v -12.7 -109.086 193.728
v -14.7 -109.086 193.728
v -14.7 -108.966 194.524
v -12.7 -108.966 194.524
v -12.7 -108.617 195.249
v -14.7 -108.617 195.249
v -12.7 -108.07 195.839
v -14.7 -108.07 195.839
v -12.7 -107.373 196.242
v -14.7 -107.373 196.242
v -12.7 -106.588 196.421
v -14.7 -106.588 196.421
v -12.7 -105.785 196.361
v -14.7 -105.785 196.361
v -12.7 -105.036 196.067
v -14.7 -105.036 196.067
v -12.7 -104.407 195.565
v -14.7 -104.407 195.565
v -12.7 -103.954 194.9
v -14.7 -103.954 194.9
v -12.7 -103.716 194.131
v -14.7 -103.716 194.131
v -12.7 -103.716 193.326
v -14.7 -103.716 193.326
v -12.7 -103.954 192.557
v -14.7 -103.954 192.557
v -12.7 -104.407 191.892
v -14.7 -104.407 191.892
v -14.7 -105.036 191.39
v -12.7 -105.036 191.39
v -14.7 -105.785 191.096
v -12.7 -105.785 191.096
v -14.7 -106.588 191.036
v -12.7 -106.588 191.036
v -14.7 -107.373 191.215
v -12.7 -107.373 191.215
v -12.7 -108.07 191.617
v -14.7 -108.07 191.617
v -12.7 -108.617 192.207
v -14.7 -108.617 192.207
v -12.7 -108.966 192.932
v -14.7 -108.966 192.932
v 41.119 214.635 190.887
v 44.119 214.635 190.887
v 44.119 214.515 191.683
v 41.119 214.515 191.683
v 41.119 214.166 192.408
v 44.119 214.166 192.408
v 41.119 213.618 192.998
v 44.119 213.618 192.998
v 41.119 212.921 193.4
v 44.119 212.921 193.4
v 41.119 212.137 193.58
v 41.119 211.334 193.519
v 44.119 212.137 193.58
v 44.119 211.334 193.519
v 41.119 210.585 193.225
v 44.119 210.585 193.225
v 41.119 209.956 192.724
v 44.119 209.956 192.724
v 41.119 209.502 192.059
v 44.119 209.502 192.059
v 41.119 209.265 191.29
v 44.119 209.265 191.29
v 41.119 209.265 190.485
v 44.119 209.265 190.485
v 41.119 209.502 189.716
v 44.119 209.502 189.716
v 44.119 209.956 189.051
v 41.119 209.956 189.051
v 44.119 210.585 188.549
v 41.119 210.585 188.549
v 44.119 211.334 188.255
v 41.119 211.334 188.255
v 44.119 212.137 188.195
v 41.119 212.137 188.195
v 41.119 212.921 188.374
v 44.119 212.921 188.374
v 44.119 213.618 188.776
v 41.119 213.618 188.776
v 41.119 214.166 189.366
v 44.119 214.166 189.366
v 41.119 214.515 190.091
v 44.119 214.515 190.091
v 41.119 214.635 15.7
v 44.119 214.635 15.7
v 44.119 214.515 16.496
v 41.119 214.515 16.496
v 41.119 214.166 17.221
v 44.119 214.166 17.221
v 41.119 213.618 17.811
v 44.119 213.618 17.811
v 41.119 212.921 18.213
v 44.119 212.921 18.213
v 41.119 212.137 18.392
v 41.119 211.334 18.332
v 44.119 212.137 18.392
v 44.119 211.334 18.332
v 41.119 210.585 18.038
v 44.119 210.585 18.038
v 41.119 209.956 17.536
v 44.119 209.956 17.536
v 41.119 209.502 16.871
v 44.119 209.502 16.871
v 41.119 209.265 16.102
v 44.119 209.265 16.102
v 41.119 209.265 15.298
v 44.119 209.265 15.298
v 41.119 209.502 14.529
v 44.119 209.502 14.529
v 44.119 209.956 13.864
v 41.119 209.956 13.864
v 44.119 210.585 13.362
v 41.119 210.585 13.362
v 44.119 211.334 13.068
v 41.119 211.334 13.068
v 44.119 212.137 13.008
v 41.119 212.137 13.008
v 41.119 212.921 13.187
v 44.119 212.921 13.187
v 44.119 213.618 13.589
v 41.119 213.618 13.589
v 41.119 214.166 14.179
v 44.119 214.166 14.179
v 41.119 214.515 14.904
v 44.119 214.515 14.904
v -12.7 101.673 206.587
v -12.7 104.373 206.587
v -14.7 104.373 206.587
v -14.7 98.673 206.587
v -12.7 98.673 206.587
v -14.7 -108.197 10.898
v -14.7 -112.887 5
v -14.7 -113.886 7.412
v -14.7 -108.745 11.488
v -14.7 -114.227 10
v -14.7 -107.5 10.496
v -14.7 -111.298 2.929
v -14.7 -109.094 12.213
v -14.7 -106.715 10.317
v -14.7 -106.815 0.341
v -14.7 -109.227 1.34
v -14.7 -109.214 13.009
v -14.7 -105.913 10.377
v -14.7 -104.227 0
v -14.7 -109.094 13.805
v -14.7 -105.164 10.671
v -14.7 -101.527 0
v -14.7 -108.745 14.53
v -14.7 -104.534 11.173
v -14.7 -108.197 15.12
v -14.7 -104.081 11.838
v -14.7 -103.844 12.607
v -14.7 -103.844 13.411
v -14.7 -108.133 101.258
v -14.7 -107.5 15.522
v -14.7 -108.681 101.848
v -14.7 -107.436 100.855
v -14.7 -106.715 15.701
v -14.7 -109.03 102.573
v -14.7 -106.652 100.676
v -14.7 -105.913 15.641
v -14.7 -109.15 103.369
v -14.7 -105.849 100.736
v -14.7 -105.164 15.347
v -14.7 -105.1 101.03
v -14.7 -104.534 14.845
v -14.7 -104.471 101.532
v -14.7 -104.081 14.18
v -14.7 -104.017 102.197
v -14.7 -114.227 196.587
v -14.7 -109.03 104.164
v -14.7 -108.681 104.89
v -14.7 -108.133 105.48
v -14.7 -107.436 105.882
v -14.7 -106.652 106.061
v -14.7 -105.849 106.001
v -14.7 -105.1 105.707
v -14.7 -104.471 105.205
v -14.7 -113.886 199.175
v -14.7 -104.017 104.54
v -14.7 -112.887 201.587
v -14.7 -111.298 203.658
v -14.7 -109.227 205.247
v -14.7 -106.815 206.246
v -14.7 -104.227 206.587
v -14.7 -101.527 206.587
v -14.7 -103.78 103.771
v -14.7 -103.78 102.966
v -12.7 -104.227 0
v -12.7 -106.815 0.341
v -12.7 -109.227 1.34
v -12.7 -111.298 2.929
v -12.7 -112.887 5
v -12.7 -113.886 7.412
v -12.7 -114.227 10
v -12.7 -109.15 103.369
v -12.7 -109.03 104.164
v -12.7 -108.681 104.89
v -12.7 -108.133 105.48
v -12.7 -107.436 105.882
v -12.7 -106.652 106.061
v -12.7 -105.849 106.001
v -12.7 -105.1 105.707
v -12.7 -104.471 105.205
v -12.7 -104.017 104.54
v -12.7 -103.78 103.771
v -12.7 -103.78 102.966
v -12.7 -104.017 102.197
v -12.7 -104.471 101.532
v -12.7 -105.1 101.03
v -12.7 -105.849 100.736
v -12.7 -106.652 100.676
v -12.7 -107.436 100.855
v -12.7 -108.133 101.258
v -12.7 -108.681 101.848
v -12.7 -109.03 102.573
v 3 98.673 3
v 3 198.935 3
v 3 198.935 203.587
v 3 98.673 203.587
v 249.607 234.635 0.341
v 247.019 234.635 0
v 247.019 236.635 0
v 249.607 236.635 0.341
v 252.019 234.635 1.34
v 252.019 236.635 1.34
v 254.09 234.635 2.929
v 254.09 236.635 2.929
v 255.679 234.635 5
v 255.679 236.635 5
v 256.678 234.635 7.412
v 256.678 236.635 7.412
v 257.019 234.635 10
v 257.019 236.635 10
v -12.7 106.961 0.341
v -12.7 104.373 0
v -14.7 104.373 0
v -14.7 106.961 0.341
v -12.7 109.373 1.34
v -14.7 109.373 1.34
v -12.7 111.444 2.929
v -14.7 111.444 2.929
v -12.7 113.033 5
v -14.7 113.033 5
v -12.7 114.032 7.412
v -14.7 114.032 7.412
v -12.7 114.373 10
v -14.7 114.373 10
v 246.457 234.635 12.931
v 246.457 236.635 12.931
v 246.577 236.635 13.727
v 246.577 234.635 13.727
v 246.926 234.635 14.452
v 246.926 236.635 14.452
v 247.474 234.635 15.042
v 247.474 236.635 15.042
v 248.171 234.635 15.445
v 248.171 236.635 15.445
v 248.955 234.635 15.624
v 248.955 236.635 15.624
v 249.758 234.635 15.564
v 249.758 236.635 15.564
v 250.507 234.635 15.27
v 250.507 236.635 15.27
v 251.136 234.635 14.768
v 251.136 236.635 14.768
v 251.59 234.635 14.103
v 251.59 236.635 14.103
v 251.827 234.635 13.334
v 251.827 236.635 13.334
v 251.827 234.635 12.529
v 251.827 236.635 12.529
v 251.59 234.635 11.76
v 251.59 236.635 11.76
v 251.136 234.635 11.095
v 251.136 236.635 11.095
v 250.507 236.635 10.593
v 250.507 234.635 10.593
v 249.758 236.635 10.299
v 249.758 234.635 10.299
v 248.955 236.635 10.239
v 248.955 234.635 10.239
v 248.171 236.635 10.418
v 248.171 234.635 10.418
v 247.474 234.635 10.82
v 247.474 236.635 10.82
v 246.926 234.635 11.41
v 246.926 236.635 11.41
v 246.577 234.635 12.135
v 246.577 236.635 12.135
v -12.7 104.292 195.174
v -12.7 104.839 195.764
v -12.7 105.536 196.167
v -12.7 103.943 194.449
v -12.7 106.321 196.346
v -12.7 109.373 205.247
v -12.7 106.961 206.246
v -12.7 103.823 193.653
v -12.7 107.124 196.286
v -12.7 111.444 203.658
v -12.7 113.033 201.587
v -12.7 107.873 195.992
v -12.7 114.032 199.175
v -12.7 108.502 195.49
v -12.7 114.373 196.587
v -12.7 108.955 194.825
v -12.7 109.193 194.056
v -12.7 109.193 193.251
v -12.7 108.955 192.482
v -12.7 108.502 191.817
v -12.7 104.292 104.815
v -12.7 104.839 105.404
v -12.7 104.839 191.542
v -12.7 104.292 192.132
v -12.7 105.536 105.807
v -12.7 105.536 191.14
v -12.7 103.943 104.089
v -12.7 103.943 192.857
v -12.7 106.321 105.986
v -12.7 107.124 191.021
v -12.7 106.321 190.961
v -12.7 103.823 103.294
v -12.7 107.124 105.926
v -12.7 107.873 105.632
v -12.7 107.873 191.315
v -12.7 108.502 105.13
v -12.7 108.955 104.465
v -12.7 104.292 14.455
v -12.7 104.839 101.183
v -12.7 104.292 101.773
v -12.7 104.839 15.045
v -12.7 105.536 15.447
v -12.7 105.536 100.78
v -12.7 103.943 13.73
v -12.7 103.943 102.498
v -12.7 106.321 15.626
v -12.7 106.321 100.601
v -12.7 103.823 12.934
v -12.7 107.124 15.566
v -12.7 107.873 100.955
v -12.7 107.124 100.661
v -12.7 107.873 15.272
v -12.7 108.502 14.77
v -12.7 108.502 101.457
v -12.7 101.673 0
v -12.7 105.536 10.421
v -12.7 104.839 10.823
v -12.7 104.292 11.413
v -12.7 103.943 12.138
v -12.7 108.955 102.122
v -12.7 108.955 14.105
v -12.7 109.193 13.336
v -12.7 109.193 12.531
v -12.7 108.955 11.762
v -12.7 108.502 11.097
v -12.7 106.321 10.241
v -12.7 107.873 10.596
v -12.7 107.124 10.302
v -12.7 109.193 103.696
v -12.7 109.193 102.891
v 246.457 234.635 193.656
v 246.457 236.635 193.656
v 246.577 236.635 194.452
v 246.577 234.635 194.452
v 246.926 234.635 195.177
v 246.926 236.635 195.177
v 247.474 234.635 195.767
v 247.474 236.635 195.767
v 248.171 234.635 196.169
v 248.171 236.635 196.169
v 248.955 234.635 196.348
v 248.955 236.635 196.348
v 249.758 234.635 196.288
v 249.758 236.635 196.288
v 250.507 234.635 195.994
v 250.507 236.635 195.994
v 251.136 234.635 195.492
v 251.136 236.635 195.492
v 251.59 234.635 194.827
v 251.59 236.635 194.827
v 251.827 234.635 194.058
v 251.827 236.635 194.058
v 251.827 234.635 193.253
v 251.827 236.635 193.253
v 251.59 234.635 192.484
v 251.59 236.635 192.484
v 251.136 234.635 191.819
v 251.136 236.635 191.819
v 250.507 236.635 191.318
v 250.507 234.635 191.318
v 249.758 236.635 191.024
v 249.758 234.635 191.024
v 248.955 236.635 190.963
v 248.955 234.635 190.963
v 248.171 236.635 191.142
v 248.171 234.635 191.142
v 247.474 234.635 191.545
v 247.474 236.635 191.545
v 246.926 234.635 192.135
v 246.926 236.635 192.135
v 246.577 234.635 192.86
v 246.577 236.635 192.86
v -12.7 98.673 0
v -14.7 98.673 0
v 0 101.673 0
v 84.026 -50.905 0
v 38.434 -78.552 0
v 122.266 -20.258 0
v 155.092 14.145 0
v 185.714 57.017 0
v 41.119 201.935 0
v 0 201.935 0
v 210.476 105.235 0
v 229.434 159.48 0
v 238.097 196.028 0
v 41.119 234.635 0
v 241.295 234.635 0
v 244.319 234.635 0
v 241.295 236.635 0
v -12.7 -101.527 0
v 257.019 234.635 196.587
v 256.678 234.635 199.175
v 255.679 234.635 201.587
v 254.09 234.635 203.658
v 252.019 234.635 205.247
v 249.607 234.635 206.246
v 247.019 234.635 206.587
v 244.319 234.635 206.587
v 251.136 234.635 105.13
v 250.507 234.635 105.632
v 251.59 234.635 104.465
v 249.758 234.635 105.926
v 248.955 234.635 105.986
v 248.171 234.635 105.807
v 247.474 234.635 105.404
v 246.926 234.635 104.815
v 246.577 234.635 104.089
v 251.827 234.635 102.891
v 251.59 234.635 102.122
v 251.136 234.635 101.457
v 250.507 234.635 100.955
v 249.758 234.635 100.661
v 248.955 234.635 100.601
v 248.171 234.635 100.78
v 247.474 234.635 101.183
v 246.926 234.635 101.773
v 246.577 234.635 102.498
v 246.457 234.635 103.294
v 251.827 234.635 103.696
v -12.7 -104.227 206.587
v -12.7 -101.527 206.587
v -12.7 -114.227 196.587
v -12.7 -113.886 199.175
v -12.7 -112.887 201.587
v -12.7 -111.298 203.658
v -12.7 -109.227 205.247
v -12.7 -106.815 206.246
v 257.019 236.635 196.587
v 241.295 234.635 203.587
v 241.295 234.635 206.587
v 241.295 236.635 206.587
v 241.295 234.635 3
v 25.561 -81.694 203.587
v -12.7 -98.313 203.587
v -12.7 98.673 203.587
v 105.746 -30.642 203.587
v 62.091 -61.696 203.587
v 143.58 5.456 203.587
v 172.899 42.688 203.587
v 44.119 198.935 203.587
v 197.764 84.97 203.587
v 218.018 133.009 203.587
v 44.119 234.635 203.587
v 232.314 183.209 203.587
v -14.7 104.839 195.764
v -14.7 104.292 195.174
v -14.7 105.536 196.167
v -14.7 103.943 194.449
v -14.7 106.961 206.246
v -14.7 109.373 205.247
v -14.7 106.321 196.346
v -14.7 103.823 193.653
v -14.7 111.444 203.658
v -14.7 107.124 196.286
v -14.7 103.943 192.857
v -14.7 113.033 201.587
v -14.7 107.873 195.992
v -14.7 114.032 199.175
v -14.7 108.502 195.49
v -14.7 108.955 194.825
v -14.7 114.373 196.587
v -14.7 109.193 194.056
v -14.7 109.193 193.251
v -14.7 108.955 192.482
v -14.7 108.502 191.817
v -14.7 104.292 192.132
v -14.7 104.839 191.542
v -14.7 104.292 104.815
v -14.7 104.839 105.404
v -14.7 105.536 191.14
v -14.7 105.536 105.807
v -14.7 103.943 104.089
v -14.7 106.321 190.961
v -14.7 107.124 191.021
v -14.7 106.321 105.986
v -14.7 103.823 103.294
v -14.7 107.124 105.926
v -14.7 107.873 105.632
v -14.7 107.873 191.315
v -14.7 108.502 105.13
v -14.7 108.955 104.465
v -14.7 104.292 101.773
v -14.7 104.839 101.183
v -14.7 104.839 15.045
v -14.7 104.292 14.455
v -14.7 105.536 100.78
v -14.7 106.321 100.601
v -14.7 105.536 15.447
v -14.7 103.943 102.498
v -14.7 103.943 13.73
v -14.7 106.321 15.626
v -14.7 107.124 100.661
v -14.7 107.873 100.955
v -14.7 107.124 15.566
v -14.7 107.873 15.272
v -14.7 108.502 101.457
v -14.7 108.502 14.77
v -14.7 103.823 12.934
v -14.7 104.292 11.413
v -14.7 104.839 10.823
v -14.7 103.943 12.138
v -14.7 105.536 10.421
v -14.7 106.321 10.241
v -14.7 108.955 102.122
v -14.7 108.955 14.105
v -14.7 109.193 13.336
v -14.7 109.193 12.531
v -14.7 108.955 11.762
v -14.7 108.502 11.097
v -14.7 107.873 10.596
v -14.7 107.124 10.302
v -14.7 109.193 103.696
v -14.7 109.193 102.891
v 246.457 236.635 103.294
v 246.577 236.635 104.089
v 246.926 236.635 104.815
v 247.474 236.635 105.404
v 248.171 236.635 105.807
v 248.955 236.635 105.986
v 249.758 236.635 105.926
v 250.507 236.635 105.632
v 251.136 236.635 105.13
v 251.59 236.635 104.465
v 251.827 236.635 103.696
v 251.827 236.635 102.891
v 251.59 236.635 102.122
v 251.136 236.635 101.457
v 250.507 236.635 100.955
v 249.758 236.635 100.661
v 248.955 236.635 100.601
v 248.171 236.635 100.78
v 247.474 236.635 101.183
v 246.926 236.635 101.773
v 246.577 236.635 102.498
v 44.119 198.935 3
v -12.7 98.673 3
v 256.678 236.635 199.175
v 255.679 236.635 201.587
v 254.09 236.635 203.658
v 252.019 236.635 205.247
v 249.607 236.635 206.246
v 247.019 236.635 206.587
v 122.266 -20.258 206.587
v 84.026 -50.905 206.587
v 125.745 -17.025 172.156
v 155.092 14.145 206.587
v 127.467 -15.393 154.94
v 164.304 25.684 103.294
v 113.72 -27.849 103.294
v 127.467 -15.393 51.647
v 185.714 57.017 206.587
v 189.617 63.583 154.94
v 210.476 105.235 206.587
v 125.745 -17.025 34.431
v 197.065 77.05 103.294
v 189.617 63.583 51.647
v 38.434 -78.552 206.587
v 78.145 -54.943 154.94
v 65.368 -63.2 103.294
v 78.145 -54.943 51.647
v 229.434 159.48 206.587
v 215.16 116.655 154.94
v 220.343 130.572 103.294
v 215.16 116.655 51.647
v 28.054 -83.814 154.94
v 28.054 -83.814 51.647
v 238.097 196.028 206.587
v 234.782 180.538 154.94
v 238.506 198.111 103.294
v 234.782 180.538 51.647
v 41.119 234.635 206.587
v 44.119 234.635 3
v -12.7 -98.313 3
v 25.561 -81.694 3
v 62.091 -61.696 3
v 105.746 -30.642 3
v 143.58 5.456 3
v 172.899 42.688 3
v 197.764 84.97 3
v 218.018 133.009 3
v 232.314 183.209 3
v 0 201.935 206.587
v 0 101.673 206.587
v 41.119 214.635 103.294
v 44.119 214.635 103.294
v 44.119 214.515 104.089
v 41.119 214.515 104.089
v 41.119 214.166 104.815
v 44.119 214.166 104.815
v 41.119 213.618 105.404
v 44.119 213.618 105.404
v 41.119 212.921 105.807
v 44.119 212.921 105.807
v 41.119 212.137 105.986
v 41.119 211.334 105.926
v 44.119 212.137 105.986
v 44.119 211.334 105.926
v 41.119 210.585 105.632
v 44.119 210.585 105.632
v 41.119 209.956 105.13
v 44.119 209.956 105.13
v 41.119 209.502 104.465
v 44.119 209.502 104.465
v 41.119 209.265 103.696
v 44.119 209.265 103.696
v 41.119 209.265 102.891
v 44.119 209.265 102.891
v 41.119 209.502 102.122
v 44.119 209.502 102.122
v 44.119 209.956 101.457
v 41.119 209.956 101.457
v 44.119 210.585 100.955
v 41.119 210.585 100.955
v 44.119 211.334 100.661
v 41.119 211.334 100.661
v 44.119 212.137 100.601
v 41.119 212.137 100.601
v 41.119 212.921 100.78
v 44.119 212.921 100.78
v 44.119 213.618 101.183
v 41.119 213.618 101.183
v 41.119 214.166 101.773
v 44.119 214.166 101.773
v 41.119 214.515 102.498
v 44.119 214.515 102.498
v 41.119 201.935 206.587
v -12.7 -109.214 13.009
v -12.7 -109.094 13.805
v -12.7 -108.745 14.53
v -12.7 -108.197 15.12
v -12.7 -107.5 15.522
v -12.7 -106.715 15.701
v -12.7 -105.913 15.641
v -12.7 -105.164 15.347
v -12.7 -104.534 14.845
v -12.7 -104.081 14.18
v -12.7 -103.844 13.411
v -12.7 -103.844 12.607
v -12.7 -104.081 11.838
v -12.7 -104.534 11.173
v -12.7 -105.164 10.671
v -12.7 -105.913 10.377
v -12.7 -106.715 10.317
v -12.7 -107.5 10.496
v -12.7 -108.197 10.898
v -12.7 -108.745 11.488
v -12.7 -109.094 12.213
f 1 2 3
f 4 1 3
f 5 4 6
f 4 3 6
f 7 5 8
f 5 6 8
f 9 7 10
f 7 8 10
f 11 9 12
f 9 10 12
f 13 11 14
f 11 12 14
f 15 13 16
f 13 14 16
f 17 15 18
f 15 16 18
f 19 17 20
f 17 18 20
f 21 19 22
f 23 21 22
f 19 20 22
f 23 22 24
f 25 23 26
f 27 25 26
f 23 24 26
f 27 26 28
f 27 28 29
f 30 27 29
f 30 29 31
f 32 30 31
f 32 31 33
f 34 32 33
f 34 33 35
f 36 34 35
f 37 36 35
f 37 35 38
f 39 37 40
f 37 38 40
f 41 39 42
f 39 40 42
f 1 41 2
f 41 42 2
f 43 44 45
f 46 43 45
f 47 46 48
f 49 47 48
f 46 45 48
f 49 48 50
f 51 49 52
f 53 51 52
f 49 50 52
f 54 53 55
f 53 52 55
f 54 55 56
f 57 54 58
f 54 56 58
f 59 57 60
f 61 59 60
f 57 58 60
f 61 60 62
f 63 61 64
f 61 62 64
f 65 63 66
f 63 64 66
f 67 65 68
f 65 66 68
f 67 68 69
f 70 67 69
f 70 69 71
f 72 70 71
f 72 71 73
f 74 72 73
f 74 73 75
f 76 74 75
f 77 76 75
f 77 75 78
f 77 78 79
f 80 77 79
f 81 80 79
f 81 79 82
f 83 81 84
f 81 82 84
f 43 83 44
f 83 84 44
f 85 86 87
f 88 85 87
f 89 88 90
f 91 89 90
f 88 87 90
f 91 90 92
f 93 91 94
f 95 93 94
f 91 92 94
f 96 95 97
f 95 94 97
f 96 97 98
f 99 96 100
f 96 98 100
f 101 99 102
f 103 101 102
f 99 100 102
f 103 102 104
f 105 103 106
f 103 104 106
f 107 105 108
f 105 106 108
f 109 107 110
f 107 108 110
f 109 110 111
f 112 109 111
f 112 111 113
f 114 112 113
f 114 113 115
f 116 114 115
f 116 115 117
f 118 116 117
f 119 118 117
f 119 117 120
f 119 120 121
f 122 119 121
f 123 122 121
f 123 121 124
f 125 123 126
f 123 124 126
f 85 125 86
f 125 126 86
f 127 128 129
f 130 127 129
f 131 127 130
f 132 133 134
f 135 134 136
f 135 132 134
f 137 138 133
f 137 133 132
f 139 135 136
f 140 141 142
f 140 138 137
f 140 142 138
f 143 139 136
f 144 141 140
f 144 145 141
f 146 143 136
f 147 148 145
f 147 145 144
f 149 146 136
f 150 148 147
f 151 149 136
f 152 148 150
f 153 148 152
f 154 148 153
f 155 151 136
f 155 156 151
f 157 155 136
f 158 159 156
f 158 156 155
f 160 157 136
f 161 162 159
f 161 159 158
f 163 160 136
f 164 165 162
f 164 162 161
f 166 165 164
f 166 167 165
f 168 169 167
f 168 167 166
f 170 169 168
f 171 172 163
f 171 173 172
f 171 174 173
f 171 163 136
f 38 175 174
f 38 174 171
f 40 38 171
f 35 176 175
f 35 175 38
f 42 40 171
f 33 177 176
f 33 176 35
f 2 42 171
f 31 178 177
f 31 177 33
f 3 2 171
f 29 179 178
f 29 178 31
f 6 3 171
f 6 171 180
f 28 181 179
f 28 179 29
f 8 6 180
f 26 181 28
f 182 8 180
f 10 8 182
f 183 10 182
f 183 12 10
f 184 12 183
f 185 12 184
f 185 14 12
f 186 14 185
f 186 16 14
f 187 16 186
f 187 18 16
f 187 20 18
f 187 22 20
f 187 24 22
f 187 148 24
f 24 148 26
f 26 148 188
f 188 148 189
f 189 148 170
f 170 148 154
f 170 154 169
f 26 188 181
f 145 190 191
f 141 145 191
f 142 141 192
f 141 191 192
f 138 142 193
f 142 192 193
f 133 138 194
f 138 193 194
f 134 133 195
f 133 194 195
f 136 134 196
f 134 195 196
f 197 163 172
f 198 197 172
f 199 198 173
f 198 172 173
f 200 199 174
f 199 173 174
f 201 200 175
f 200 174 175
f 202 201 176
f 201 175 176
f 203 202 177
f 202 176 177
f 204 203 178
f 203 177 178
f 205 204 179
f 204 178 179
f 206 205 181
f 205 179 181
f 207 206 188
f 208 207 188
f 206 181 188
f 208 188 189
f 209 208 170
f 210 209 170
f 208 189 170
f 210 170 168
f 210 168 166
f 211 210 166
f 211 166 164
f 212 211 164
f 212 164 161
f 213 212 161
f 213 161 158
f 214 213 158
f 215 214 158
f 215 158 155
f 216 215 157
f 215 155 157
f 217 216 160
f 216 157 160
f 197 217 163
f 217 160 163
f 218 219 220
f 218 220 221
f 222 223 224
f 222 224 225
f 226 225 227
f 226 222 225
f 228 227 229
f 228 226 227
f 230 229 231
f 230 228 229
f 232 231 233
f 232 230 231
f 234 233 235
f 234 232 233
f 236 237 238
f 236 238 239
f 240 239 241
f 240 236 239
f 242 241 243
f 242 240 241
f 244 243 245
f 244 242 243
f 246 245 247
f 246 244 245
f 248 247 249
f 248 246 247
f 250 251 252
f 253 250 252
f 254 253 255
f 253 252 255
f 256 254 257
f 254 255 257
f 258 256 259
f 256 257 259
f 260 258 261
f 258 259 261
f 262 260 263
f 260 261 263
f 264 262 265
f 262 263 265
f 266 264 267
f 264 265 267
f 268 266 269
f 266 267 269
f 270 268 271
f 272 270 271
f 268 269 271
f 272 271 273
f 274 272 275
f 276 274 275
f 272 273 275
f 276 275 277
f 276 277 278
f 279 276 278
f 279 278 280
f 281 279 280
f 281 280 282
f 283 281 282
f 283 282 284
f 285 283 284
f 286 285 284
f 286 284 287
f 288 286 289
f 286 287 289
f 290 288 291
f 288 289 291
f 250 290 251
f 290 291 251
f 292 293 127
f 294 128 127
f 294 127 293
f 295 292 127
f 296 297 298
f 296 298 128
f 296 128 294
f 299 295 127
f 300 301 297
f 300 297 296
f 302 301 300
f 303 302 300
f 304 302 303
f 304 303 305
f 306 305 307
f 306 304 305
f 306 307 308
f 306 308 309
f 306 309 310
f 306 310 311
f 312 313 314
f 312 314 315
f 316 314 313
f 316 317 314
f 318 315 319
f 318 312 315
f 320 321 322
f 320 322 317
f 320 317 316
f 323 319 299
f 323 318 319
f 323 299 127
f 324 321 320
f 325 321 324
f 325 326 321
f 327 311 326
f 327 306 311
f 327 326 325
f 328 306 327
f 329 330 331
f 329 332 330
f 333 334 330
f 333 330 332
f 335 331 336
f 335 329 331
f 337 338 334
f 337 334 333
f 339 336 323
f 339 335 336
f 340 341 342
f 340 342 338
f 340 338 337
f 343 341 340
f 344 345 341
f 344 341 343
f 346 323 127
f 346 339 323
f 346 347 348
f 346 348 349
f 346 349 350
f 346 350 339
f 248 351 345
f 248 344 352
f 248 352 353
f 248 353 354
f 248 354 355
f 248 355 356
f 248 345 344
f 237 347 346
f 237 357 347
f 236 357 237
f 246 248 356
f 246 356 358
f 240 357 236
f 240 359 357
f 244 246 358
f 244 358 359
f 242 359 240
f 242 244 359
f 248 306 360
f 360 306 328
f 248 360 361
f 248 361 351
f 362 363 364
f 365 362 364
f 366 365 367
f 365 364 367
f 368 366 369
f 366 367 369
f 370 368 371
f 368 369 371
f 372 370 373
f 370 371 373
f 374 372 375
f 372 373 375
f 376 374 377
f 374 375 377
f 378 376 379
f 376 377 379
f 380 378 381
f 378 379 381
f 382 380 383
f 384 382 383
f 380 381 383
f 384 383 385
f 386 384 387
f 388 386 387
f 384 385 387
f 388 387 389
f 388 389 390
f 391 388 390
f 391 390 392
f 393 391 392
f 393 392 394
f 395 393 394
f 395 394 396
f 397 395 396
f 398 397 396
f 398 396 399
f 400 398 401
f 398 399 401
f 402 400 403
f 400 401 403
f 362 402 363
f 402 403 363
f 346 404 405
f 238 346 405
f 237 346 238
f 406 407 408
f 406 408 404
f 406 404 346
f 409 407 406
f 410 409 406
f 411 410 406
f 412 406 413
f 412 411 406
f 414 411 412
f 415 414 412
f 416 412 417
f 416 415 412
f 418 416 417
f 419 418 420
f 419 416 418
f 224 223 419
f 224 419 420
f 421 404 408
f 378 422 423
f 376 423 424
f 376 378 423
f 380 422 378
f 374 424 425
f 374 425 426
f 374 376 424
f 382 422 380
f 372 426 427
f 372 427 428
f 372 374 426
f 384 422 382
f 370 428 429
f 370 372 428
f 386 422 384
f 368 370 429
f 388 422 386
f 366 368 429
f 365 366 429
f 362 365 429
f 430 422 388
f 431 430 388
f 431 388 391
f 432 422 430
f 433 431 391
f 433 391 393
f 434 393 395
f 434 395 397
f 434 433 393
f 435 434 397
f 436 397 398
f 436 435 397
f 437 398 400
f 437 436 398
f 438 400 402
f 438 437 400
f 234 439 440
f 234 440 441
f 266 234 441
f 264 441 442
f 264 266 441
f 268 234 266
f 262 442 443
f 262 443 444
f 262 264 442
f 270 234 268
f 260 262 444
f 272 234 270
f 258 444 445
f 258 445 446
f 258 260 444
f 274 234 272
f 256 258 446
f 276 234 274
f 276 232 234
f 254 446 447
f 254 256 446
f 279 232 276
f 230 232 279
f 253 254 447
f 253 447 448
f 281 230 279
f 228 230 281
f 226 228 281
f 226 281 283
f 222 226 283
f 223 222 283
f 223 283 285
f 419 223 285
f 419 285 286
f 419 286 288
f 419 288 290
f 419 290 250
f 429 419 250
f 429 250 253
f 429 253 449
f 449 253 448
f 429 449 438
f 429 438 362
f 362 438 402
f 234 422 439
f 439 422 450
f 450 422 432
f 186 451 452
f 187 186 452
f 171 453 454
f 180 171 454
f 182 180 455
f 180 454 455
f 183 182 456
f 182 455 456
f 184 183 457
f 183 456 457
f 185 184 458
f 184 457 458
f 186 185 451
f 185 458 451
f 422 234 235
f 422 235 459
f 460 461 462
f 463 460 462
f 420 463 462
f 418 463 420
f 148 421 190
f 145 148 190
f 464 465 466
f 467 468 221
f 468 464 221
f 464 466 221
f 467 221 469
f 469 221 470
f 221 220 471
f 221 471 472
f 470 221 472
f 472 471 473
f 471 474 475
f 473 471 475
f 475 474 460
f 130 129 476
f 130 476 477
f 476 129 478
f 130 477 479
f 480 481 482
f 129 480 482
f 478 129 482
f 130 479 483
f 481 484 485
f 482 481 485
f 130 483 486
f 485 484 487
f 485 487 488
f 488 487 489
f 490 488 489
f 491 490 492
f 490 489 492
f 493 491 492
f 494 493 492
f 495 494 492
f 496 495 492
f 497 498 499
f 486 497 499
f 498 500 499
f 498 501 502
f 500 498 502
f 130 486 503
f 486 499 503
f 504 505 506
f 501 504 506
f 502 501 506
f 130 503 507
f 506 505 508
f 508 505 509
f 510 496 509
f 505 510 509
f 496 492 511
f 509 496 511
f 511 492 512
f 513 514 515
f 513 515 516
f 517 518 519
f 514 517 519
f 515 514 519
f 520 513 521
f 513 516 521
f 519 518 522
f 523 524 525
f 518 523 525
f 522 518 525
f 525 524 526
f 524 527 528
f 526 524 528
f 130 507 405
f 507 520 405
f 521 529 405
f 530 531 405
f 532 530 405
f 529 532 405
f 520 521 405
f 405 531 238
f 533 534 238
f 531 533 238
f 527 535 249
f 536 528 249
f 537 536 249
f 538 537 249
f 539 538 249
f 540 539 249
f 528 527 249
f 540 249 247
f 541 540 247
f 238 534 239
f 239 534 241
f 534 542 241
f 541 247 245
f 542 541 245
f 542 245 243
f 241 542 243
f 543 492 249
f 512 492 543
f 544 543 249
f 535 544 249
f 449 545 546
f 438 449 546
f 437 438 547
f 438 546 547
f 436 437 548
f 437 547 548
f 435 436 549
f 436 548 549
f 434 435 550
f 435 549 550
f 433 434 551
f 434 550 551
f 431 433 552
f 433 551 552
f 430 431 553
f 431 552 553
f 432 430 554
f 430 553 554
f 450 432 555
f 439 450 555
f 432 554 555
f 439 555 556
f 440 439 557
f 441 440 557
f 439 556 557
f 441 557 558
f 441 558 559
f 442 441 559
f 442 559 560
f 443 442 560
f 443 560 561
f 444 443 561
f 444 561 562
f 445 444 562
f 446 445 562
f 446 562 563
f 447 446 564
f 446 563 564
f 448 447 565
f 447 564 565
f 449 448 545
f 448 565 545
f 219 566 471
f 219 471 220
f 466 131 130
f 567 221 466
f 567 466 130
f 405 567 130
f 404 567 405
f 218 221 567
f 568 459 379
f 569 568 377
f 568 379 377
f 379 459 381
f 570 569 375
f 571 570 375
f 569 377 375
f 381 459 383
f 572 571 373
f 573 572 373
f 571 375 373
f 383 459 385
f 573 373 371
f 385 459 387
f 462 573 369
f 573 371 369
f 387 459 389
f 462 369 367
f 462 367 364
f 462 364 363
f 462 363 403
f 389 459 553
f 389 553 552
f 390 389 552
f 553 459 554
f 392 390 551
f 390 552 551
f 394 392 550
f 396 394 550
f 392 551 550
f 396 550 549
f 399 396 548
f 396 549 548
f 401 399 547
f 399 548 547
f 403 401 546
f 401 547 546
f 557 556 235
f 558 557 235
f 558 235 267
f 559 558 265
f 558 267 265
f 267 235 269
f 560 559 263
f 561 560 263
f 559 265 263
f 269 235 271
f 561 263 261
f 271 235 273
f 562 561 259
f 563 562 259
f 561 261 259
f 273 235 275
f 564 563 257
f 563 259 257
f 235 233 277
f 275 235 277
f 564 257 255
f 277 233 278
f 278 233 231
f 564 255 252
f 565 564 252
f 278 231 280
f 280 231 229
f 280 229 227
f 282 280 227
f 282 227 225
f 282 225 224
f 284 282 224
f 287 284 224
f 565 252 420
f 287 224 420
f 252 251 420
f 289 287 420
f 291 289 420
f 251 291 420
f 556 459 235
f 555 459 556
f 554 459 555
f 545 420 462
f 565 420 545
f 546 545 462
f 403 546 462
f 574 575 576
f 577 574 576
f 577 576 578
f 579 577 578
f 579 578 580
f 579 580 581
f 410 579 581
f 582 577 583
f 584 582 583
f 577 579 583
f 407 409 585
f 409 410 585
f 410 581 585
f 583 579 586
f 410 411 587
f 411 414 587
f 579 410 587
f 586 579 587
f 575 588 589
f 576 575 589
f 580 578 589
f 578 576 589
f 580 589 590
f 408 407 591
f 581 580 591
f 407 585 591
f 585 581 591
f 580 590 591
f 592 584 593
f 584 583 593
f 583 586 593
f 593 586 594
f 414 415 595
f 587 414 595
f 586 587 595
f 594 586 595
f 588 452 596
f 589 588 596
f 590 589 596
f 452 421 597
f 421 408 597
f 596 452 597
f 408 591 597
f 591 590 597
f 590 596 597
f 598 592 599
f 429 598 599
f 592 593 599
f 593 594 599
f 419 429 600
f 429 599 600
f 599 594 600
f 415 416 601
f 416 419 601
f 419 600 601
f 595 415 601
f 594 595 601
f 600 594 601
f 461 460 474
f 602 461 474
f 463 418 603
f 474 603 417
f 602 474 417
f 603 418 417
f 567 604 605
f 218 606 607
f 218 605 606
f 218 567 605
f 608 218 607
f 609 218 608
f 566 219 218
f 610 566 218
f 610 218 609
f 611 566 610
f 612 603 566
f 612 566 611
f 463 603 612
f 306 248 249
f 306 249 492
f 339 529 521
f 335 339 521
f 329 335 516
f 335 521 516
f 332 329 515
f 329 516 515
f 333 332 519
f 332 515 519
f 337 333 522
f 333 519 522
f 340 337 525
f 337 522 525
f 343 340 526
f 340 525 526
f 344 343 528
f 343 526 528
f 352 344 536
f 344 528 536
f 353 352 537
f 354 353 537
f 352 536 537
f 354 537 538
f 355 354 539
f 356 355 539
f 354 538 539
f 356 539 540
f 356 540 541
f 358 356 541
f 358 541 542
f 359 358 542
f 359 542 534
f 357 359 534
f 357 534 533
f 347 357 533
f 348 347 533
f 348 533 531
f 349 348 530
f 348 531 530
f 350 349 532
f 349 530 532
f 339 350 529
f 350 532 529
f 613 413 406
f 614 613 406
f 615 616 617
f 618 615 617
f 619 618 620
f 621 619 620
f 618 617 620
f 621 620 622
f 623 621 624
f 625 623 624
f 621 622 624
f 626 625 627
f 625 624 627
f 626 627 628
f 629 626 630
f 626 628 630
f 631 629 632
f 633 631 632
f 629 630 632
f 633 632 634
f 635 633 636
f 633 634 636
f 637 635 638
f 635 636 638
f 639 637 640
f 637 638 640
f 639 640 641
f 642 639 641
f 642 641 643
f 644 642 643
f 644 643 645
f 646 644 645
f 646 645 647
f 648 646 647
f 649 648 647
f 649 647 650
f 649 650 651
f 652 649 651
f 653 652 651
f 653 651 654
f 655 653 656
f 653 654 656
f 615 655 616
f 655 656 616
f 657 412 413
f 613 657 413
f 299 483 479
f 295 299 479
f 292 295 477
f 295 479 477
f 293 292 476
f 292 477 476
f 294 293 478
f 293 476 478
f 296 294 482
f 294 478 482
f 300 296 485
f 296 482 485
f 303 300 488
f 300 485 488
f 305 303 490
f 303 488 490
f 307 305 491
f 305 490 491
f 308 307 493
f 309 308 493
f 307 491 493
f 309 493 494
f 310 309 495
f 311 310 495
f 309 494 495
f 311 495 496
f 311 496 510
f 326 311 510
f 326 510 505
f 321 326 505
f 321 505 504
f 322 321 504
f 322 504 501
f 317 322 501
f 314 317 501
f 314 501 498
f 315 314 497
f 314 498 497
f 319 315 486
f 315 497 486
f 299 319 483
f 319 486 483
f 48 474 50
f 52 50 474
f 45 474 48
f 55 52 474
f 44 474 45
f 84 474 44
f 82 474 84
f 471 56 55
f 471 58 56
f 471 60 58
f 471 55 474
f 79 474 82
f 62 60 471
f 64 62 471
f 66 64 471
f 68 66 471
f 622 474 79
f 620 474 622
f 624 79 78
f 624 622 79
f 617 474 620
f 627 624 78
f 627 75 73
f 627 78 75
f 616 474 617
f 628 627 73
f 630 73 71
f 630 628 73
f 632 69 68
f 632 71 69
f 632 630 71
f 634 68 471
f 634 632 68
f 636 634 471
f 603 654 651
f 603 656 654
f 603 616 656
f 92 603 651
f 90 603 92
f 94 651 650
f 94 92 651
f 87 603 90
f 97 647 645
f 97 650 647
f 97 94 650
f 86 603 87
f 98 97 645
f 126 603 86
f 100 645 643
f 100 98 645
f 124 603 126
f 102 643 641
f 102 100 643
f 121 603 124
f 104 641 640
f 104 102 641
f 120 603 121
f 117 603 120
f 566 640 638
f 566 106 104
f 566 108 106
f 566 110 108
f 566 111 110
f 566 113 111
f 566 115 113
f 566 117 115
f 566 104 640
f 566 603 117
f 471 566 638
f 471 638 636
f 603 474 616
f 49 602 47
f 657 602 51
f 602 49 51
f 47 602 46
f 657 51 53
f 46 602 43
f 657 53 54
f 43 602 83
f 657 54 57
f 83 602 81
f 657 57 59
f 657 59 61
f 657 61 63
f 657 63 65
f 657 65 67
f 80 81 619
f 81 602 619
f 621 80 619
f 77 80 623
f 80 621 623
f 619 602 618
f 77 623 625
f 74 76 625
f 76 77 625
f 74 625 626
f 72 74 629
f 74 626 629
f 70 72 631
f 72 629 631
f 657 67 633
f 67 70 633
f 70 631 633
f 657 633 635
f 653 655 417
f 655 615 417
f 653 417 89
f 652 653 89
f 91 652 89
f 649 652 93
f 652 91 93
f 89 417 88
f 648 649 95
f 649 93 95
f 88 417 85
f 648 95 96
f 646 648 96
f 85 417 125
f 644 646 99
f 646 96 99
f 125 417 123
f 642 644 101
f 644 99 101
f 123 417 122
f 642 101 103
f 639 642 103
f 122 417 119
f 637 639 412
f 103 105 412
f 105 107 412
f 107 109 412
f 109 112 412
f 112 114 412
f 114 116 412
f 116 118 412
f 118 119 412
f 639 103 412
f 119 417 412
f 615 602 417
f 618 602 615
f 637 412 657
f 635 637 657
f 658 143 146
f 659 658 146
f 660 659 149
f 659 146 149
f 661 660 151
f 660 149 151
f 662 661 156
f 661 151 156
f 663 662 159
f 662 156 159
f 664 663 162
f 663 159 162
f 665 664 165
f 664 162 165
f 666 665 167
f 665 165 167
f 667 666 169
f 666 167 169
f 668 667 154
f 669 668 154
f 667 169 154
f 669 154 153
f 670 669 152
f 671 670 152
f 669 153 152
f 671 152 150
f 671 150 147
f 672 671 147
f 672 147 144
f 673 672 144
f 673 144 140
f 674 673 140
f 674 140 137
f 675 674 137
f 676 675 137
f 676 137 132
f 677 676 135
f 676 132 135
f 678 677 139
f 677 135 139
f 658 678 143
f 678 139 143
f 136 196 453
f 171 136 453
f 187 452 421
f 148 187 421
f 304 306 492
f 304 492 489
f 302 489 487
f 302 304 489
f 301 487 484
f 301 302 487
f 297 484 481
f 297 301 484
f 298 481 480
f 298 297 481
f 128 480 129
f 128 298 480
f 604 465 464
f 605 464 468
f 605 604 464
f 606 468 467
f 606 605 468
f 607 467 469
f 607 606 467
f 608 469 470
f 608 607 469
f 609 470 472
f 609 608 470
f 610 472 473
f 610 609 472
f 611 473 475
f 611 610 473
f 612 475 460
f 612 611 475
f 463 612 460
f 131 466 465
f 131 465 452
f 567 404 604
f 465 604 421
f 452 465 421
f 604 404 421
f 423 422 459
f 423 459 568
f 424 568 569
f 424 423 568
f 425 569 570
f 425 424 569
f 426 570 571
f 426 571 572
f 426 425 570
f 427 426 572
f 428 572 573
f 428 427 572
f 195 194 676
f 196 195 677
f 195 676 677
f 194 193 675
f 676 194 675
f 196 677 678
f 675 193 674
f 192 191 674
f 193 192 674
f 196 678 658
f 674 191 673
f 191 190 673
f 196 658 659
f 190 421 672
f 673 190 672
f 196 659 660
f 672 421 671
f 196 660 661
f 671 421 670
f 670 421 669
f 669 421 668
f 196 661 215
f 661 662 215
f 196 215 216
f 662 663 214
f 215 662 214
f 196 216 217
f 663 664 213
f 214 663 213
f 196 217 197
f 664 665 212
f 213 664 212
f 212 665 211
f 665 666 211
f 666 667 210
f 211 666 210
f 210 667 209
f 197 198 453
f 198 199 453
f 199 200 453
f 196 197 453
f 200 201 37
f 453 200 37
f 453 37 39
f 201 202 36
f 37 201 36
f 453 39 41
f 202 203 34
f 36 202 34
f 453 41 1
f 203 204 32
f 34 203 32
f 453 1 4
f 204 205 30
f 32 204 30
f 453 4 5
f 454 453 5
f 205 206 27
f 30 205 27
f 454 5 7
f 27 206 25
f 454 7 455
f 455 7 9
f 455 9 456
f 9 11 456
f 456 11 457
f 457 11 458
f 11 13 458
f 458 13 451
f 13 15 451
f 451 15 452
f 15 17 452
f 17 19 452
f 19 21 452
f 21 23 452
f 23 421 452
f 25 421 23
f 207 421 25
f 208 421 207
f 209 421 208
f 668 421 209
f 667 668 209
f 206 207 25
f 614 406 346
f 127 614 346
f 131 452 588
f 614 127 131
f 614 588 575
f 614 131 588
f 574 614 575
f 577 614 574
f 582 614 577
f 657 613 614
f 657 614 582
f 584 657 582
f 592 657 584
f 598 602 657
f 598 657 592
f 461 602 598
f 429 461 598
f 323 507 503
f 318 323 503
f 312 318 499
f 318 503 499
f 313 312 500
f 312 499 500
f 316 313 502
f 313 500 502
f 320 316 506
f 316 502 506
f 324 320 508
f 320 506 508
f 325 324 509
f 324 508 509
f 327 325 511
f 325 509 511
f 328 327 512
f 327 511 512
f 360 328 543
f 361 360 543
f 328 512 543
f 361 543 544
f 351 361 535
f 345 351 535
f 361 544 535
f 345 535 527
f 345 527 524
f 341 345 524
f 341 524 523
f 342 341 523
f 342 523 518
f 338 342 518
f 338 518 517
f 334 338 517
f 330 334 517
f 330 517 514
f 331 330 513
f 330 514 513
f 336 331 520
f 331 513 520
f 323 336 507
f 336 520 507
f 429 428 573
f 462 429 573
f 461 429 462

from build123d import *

# Parameters (mm, degrees)
BOSS_EXTRUDE3_DEPTH = 206.587093
SHELL1_T            = -3
BOSS_EXTRUDE4_DEPTH = 2
BOSS_EXTRUDE5_DEPTH = 2
SKETCH8_R           = 2.7
CUT_EXTRUDE2_DEPTH  = 3
SKETCH9_R           = 2.7
CUT_EXTRUDE3_DEPTH  = 2
SKETCH11_R          = 2.7
CUT_EXTRUDE4_DEPTH  = 2


with BuildPart() as part:
    # Sketch1 → Boss-Extrude3 (new body)
    with BuildSketch(Plane.XY):
        with BuildLine():
            Line((244.319092767, 234.634840909), (41.119092767, 234.634840909))
            Line((41.119092767, 234.634840909), (41.119092767, 201.934840909))
            Line((41.119092767, 201.934840909), (0, 201.934840909))
            Line((0, 201.934840909), (0, 101.672858907))
            Line((0, 101.672858907), (-12.7, 101.672858907))
            Line((-12.7, 101.672858907), (-12.7, -101.527141093))
            add(Edge.make_bspline(
                [(-12.7, -101.527141093), (212.797902698, -15.185130796), (244.319092767, 234.634840909)],
                knots=[0, 0, 0, 1, 1, 1], degree=2))
        make_face()
    extrude(amount=BOSS_EXTRUDE3_DEPTH)

    # Shell1
    shell1_openings = [part.faces().sort_by_distance(p)[0] for p in [
        (142.719092767, 234.634840909, 103.2935465),
        (-12.7, 0.072858907, 103.2935465),
    ]]
    offset(amount=SHELL1_T, openings=shell1_openings, kind=Kind.INTERSECTION)

    # Sketch4 → Boss-Extrude4 (add)
    with BuildSketch(Plane(origin=(0, 234.634840909, 0), x_dir=(1, 0, 0), z_dir=(0, 1, 0))):
        with BuildLine():
            Line((257.019092767, -10), (257.019092767, -196.587092864))
            ThreePointArc((257.019092767, -196.587092864), (254.090160579, -203.658160676), (247.019092767, -206.587092864))
            Line((247.019092767, -206.587092864), (244.319092767, -206.587092864))
            Line((244.319092767, -206.587092864), (241.295184716, -206.587092864))
            Line((241.295184716, -206.587092864), (241.295184716, 0))
            Line((241.295184716, 0), (247.019092767, 0))
            ThreePointArc((247.019092767, 0), (254.090160579, -2.928932188), (257.019092767, -10))
        make_face()
    extrude(amount=BOSS_EXTRUDE4_DEPTH)

    # Sketch5 → Boss-Extrude5 (add)
    with BuildSketch(Plane.ZY.offset(12.7)):
        with BuildLine():
            Line((10, 114.372858907), (196.587092864, 114.372858907))
            ThreePointArc((196.587092864, 114.372858907), (203.658160676, 111.443926719), (206.587092864, 104.372858907))
            Line((206.587092864, 104.372858907), (206.587092864, 98.672858907))
            Line((206.587092864, 98.672858907), (0, 98.672858907))
            Line((0, 98.672858907), (0, 104.372858907))
            ThreePointArc((0, 104.372858907), (2.928932188, 111.443926719), (10, 114.372858907))
        make_face()
        with BuildLine():
            Line((0, -101.527141093), (0, -104.227141093))
            ThreePointArc((0, -104.227141093), (2.928932188, -111.298208905), (10, -114.227141093))
            Line((10, -114.227141093), (196.587092864, -114.227141093))
            ThreePointArc((196.587092864, -114.227141093), (203.658160676, -111.298208905), (206.587092864, -104.227141093))
            Line((206.587092864, -104.227141093), (206.587092864, -101.527141093))
            Line((206.587092864, -101.527141093), (0, -101.527141093))
        make_face()
    extrude(amount=BOSS_EXTRUDE5_DEPTH)


with BuildPart() as boss_extrude5_piece_1:
    # of the separate pieces the step leaves, piece 1, a body of its own (boss_extrude5_pieces)
    add(part.part.solids().sort_by_distance((41.119092767, 234.634840909, 0))[0])

    # Sketch8 → Cut-Extrude2 (cut)
    with BuildSketch(Plane(origin=(44.119092767, 0, 0), x_dir=(0, 0, -1), z_dir=(1, 0, 0))):
        with Locations(Location((-190.887092864, 211.934840909, 0), (0, 0, 90))):
            Circle(SKETCH8_R)
        with Locations(Location((-103.293546432, 211.934840909, 0), (0, 0, 90))):
            Circle(SKETCH8_R)
        with Locations(Location((-15.7, 211.934840909, 0), (0, 0, 90))):
            Circle(SKETCH8_R)
    extrude(amount=-CUT_EXTRUDE2_DEPTH, mode=Mode.SUBTRACT)

    # Sketch9 → Cut-Extrude3 (cut)
    with BuildSketch(Plane(origin=(0, 236.634840909, 0), x_dir=(1, 0, 0), z_dir=(0, 1, 0))):
        with Locations(Location((249.157138742, -12.931235523, 0), (0, 0, 180))):
            Circle(SKETCH9_R)
        with Locations(Location((249.157138742, -103.293546432, 0), (0, 0, 180))):
            Circle(SKETCH9_R)
        with Locations(Location((249.157138742, -193.655857341, 0), (0, 0, 180))):
            Circle(SKETCH9_R)
    extrude(amount=-CUT_EXTRUDE3_DEPTH, mode=Mode.SUBTRACT)


with BuildPart() as boss_extrude5_piece_2:
    # of the separate pieces the step leaves, piece 2, a body of its own (boss_extrude5_pieces)
    add(part.part.solids().sort_by_distance((-14.7, -101.527141093, 206.587092864))[0])


with BuildPart() as cut_extrude4_tool:
    # Sketch11 → Cut-Extrude4 (new body)
    with BuildSketch(Plane.ZY.offset(14.7)):
        with Locations(Location((12.933859514, 106.522858907, 0), (0, 0, 270))):
            Circle(SKETCH11_R)
        with Locations(Location((103.293546432, 106.522858907, 0), (0, 0, 270))):
            Circle(SKETCH11_R)
        with Locations(Location((193.653233351, 106.522858907, 0), (0, 0, 270))):
            Circle(SKETCH11_R)
        with Locations(Location((193.728321895, -106.386237609, 0), (0, 0, 270))):
            Circle(SKETCH11_R)
        with Locations(Location((103.368657455, -106.44997351, 0), (0, 0, 270))):
            Circle(SKETCH11_R)
        with Locations(Location((13.008993014, -106.51370941, 0), (0, 0, 270))):
            Circle(SKETCH11_R)
    extrude(amount=-CUT_EXTRUDE4_DEPTH)


with BuildPart() as boss_extrude5_piece_1_1:
    add(boss_extrude5_piece_1.part)

    # Cut-Extrude4: cut by cut_extrude4_tool
    add(cut_extrude4_tool.part, mode=Mode.SUBTRACT)


with BuildPart() as boss_extrude5_piece_2_1:
    add(boss_extrude5_piece_2.part)

    # Cut-Extrude4: cut by cut_extrude4_tool
    add(cut_extrude4_tool.part, mode=Mode.SUBTRACT)


solid = Compound([boss_extrude5_piece_1_1.part, boss_extrude5_piece_2_1.part])
